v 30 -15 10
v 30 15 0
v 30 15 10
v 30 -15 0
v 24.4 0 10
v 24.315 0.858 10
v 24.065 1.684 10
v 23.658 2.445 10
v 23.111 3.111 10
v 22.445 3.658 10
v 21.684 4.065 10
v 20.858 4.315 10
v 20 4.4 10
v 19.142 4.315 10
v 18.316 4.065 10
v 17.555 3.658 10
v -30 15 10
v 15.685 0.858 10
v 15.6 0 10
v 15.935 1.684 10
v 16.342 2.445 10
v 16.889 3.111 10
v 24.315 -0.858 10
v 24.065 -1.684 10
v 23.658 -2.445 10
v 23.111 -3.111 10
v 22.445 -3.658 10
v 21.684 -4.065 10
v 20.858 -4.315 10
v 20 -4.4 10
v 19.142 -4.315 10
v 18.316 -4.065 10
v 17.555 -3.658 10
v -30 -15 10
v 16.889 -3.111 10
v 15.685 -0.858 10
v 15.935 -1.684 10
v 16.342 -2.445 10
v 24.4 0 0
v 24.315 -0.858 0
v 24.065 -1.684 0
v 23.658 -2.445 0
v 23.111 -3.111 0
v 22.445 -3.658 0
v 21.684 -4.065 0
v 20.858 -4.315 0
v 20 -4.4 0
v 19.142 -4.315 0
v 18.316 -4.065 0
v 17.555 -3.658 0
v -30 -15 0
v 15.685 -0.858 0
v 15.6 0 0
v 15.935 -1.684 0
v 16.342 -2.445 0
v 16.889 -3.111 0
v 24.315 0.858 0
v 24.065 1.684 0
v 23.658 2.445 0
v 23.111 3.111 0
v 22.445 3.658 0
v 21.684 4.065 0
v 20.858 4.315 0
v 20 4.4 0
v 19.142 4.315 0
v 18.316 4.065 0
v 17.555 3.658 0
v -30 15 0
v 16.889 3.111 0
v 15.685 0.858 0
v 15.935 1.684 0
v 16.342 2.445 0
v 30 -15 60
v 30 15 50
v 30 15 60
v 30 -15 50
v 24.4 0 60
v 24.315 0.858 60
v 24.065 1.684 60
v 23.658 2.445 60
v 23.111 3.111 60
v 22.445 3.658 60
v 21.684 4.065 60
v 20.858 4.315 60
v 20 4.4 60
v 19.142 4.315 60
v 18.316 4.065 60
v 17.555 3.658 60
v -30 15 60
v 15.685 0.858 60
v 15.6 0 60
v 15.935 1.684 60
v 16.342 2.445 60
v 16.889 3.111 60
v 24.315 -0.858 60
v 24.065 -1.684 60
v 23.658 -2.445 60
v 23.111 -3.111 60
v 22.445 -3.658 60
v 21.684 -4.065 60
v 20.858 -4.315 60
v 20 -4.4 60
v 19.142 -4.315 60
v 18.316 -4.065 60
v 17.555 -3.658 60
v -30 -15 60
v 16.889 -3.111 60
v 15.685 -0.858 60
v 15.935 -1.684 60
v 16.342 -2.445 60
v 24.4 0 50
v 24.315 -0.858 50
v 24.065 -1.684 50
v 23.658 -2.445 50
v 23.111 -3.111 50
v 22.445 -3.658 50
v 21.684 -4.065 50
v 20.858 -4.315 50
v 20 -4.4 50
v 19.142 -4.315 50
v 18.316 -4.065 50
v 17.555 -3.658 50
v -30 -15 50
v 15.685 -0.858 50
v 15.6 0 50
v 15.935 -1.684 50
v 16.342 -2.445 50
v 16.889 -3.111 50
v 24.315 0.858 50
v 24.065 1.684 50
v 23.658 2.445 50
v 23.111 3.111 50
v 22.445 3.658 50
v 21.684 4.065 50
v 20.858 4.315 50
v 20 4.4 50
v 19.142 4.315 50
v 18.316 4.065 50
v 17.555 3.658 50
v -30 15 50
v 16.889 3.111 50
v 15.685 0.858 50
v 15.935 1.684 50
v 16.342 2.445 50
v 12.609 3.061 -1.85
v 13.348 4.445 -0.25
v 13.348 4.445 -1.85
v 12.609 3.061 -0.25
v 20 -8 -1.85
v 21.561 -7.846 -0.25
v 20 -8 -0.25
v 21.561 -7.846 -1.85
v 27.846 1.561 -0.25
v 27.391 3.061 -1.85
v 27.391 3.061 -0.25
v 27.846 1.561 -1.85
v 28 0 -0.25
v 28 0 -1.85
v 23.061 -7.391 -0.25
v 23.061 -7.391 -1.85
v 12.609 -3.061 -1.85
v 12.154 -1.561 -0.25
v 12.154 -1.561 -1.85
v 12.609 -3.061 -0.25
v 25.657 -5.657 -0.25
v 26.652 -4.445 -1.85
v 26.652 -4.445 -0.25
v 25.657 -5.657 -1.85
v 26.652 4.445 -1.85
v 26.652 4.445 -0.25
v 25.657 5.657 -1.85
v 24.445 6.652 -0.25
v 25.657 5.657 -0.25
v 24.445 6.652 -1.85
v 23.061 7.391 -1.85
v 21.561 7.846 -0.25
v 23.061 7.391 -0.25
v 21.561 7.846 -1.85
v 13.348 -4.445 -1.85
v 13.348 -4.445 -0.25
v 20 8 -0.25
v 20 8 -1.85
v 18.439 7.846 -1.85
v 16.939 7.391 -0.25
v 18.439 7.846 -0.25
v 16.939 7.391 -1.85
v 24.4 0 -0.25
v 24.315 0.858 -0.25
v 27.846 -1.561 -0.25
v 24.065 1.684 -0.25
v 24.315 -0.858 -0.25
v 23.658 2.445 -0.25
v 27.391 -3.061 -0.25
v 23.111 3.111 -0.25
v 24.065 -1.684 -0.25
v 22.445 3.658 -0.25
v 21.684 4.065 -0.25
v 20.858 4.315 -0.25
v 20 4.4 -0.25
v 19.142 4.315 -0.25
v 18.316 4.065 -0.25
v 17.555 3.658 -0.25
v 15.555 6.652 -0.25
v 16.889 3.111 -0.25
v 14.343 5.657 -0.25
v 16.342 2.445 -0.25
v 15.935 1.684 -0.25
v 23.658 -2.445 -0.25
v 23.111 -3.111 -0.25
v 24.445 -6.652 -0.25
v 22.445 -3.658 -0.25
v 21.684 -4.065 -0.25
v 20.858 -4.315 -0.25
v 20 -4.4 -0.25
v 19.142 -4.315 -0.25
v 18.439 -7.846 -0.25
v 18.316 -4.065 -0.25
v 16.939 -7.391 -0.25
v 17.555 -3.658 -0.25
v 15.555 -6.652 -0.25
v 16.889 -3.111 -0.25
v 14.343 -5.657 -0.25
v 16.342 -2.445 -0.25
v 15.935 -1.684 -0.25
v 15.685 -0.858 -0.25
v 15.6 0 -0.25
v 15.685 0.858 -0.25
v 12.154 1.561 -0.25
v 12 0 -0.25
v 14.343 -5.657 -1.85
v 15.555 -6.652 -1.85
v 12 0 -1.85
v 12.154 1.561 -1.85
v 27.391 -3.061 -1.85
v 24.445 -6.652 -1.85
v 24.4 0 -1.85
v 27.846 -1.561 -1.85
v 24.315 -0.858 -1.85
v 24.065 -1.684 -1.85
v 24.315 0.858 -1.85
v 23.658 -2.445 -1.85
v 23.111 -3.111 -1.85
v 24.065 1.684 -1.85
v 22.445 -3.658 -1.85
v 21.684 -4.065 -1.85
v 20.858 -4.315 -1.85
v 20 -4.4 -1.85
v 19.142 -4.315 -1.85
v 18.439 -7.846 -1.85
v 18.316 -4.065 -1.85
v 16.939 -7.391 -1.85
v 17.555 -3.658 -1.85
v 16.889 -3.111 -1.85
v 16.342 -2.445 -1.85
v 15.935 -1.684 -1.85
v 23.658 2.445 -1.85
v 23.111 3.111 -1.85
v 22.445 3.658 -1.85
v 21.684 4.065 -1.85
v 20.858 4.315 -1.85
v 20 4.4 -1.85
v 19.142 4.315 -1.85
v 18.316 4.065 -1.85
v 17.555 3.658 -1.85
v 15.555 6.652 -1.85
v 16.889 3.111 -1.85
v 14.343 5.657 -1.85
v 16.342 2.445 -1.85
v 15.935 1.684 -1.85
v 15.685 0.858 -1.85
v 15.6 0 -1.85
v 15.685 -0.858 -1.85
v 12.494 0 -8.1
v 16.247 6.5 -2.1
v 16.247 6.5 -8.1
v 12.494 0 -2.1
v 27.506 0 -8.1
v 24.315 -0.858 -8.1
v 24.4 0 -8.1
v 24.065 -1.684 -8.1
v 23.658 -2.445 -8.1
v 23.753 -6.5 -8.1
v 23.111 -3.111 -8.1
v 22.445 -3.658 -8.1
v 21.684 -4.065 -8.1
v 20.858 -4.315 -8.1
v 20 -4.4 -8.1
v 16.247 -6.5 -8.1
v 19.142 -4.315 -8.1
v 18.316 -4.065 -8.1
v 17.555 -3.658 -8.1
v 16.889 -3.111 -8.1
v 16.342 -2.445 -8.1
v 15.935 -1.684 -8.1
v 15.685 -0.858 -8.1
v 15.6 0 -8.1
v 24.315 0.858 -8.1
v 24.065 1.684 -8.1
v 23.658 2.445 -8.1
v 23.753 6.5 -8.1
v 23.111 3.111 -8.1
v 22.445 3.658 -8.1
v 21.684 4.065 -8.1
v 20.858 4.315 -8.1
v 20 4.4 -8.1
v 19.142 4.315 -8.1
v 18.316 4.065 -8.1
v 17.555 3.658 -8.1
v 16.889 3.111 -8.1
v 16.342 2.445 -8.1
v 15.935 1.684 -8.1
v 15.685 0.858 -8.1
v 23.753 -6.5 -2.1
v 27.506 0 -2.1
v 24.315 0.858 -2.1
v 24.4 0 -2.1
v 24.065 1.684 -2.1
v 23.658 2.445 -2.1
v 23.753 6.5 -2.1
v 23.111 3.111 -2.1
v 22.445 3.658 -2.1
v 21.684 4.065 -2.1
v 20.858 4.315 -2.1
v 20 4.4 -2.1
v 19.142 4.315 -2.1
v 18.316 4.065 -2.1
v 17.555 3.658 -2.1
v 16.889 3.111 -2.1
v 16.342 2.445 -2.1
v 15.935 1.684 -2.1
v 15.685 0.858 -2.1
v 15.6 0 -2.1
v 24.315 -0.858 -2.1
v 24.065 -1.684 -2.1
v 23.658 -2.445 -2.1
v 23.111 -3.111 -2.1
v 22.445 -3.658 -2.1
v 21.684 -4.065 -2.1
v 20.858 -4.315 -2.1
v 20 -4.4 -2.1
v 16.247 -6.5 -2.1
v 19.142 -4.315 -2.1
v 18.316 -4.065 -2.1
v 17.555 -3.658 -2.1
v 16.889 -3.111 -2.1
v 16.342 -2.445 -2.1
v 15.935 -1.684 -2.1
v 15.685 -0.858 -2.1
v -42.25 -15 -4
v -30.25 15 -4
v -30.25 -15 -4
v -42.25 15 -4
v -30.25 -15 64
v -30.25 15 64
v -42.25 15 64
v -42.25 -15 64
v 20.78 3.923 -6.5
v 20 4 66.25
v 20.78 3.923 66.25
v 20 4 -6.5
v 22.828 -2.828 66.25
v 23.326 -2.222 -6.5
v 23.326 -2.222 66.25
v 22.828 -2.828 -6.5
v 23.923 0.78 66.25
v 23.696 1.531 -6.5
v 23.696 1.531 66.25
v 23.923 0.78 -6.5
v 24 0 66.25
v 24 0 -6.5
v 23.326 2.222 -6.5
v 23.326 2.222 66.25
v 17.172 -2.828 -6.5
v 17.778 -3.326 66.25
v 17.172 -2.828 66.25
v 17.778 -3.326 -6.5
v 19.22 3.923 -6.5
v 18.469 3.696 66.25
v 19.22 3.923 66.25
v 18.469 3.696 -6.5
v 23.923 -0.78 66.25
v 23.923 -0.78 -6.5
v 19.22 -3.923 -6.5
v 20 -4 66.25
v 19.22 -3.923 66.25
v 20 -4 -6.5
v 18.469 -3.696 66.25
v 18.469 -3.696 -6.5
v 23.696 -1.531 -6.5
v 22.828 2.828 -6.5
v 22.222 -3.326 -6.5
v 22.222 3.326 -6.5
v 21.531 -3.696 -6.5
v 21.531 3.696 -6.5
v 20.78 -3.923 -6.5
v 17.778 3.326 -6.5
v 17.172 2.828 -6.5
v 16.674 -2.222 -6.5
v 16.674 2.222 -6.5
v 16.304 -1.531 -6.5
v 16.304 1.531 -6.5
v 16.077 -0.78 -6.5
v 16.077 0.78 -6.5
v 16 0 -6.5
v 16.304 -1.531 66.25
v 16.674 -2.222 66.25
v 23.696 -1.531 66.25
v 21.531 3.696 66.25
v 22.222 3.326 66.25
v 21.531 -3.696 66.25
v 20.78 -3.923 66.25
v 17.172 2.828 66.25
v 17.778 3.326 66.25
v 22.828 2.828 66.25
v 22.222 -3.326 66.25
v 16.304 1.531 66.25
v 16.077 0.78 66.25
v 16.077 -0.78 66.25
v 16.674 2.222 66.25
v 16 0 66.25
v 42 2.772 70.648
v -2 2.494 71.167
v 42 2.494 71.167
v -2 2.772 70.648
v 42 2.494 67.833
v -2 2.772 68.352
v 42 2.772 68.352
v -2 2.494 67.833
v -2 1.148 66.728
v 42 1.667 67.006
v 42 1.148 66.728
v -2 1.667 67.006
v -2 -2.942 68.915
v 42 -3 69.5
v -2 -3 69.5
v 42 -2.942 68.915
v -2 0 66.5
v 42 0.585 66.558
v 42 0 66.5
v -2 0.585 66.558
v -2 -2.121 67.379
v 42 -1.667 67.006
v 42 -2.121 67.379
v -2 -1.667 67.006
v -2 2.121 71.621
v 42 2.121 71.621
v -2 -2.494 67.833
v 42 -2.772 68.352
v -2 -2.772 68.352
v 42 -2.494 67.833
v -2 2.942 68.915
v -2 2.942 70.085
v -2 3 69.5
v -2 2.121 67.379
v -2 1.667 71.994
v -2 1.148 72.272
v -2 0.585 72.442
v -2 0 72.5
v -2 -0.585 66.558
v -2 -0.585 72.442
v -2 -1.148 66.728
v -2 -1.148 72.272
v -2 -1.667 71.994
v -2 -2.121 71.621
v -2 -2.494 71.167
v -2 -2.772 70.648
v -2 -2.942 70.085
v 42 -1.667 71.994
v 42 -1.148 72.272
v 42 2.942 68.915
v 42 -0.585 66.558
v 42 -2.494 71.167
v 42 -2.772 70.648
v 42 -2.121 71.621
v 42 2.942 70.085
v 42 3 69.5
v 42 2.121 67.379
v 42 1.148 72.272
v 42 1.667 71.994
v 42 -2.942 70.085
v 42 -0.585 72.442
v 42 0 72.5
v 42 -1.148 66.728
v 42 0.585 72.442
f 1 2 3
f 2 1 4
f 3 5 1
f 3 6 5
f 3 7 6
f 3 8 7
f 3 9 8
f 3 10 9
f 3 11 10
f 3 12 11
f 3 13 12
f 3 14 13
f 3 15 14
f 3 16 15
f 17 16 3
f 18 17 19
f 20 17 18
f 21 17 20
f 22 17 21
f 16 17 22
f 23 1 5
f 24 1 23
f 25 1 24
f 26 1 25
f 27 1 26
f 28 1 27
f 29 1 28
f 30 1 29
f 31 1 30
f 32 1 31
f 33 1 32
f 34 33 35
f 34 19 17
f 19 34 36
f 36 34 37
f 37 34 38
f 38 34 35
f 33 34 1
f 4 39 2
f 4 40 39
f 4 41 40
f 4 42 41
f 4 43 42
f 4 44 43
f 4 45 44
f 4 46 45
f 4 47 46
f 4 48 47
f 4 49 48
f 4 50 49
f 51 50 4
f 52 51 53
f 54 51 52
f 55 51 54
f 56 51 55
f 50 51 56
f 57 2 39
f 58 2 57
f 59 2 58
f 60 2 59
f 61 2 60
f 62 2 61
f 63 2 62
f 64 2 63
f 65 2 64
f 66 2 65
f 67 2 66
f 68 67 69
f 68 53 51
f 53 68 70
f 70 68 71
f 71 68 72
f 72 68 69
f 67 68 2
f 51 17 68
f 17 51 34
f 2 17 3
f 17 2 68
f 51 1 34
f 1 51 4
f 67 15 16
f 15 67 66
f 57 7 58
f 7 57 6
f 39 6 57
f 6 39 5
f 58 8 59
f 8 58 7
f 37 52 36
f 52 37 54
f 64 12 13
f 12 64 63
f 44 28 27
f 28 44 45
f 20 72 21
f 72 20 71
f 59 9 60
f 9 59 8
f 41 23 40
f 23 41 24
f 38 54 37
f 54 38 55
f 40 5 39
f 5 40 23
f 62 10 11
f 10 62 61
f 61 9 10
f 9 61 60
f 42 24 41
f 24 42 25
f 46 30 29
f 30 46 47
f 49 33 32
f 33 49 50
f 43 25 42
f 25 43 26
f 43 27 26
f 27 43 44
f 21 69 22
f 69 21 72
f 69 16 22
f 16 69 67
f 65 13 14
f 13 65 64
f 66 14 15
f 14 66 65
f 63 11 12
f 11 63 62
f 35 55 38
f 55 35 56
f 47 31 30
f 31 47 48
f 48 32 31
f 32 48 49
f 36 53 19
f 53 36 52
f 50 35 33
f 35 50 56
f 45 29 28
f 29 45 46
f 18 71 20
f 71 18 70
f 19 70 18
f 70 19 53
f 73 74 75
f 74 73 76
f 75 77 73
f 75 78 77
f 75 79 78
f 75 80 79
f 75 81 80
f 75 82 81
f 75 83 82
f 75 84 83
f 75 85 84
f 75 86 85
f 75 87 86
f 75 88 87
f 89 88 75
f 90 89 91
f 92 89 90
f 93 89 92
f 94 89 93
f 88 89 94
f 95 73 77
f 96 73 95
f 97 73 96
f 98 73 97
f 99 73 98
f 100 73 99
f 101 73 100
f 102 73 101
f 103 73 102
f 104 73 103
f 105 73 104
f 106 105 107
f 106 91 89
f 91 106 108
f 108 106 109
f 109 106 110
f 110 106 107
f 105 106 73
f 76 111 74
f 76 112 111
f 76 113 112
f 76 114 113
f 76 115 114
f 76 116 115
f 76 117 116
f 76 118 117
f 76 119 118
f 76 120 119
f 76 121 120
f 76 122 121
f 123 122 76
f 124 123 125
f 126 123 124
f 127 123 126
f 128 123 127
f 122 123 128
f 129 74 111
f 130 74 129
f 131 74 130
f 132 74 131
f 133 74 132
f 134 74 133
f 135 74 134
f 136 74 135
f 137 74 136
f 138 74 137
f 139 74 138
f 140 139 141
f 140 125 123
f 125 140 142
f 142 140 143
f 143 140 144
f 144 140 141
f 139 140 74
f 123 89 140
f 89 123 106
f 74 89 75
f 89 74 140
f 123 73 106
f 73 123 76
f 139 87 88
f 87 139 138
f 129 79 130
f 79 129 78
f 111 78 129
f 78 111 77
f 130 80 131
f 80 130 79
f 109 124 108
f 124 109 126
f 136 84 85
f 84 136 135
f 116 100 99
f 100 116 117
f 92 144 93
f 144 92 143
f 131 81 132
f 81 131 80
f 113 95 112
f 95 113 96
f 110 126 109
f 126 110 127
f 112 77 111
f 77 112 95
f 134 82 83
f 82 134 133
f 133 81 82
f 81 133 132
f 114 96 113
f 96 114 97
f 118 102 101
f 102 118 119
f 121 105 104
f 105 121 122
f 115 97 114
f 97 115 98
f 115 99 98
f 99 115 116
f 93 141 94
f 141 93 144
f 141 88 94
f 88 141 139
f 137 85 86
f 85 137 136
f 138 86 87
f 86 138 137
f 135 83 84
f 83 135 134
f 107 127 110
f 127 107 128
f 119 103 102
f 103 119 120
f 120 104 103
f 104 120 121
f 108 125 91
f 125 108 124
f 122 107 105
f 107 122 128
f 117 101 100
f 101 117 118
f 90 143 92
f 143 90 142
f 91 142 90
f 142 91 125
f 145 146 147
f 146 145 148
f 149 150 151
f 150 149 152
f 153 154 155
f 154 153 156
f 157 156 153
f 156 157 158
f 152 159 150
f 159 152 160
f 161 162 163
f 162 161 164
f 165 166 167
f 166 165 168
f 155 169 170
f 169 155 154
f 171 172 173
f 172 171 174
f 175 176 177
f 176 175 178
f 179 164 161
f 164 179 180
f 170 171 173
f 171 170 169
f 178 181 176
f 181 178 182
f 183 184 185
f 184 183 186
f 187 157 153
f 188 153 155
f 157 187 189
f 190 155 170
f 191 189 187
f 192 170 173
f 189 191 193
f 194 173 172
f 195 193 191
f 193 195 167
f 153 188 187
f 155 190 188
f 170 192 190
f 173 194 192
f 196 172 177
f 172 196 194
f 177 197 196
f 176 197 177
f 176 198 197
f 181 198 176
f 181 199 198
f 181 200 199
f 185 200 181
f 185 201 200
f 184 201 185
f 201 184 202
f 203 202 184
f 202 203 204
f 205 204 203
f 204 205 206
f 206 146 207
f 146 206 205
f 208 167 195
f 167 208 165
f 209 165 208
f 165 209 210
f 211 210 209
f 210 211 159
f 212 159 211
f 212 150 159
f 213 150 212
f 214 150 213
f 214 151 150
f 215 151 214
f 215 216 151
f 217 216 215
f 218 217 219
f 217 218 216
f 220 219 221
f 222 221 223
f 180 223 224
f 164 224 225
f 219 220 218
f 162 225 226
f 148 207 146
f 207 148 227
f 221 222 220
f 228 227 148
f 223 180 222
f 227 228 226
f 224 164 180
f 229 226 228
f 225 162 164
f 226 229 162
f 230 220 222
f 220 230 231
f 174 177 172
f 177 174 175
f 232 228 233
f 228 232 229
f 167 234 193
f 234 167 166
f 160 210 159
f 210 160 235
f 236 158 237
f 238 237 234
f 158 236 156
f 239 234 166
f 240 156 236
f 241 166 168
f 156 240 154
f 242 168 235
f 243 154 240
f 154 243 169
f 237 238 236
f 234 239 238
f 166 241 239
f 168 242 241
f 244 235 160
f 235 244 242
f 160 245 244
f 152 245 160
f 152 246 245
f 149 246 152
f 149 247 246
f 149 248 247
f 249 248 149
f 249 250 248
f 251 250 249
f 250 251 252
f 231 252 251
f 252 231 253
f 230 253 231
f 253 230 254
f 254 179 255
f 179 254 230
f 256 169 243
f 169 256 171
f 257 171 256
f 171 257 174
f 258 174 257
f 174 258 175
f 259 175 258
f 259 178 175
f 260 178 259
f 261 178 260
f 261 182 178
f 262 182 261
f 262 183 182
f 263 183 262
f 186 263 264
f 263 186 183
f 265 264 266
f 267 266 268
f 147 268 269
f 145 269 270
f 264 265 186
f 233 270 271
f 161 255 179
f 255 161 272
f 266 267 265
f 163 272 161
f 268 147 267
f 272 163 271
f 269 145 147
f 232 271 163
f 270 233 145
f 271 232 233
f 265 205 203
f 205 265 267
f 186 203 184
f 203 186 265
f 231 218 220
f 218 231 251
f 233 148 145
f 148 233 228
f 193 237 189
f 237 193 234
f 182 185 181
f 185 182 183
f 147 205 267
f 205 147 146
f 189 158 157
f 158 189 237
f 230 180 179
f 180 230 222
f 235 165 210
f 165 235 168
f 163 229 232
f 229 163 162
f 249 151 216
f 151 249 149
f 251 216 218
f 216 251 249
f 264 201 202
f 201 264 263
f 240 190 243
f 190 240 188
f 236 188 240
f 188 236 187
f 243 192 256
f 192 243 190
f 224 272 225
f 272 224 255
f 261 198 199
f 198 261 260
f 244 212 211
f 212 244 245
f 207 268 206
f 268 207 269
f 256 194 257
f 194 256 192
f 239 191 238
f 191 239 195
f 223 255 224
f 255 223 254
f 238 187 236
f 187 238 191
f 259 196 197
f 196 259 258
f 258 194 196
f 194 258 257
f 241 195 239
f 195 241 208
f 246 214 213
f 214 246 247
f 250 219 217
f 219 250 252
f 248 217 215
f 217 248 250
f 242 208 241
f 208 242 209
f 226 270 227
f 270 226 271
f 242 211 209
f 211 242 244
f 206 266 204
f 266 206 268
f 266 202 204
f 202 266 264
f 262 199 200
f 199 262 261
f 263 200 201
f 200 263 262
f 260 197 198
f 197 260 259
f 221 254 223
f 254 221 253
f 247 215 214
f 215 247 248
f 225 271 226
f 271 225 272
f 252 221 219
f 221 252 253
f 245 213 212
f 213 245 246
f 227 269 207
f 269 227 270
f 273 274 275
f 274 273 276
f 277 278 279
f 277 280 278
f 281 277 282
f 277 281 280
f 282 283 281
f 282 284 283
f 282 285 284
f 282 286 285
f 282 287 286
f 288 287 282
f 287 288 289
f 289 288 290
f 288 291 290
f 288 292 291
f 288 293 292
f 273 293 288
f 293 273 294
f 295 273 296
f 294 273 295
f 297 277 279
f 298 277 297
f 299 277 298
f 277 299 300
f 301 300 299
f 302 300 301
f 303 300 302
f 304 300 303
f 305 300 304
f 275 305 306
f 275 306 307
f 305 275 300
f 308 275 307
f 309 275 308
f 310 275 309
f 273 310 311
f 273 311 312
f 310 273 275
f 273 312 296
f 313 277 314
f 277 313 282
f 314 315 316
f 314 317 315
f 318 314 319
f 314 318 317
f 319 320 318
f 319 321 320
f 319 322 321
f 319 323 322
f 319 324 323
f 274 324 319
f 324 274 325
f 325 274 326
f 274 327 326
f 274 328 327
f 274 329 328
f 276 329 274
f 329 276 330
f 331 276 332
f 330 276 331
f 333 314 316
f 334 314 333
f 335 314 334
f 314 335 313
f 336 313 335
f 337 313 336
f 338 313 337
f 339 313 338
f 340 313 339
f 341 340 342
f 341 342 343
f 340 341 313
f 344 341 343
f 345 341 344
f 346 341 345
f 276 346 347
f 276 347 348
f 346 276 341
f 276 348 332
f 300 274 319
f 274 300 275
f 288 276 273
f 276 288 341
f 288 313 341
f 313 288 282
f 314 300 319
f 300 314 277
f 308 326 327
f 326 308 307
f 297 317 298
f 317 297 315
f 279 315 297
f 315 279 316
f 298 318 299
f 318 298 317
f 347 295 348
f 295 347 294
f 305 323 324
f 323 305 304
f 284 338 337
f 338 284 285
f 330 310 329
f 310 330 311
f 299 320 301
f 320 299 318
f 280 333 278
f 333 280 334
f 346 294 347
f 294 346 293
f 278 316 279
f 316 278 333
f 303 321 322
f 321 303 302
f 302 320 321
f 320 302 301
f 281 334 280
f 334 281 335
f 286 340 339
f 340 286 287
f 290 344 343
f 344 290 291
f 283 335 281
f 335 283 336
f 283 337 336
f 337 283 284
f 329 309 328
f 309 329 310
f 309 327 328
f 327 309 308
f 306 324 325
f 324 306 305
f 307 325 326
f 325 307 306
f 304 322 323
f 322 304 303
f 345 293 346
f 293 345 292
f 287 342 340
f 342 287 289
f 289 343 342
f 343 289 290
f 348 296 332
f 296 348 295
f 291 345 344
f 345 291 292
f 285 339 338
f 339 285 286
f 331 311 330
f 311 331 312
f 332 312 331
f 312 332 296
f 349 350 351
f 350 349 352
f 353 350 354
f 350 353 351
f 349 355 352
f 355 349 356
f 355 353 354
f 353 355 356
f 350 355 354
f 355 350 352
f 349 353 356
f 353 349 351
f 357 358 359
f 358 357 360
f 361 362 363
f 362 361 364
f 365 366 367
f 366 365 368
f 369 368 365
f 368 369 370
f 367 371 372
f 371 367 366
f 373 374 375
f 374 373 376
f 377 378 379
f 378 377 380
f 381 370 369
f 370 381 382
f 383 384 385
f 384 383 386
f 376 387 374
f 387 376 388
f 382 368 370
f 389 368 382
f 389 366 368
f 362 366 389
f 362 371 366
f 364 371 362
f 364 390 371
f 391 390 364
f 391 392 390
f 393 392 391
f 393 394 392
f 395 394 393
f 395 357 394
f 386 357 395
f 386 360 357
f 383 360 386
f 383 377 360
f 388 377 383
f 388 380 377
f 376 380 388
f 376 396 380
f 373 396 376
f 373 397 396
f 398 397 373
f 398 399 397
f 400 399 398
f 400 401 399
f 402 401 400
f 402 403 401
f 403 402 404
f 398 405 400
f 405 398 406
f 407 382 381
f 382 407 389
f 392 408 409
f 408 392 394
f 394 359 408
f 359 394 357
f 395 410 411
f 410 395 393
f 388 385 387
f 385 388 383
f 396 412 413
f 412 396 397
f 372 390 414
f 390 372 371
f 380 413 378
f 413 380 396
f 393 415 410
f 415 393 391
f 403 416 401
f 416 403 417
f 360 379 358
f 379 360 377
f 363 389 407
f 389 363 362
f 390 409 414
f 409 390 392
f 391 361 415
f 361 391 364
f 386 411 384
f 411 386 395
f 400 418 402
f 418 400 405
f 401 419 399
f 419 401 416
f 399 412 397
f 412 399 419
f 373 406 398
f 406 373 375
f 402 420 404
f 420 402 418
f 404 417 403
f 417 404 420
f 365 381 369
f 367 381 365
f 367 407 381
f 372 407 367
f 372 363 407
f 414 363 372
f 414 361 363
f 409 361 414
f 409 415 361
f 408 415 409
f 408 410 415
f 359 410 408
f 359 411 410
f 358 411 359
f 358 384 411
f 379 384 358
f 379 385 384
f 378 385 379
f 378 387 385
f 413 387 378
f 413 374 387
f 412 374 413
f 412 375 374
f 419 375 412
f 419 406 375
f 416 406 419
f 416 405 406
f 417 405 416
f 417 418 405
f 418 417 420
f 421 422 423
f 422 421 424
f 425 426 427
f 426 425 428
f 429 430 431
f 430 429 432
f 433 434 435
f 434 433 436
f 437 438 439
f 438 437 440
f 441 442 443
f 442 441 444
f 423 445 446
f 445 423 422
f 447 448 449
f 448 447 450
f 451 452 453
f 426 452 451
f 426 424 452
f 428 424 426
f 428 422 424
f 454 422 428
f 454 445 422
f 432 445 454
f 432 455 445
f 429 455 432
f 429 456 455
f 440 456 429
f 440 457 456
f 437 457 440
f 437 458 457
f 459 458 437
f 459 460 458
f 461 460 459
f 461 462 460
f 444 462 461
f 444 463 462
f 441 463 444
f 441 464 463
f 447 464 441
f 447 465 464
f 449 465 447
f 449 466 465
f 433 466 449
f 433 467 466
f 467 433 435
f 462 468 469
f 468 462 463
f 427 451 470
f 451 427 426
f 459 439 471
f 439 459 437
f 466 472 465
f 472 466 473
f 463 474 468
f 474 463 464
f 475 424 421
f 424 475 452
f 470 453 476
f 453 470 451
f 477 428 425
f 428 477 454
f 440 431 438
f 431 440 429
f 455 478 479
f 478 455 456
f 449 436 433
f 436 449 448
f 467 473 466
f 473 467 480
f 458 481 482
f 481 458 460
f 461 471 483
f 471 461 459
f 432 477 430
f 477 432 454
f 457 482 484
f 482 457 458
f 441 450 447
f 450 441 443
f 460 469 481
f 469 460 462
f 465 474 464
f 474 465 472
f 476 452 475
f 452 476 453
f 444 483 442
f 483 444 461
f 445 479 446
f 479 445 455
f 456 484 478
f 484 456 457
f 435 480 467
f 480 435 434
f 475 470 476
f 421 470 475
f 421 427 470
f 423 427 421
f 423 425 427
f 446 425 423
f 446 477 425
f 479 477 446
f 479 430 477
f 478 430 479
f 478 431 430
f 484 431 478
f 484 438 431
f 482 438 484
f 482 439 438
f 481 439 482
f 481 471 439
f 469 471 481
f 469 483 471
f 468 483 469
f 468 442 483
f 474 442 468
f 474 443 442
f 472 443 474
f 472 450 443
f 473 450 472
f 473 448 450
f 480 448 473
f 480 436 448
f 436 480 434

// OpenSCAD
$fn = 32;

// ------------------------------------------------------------------------
// C clamp: throat 50 mm, screw d8
// Every part is its own module, assembly() places every instance.
// ------------------------------------------------------------------------

// --- part 1 ---
module clamp_arm() {
  difference() {
    translate([-30, -15, 0]) cube([60, 30, 10]);
    translate([20, 0, -1]) cylinder(h = 12, d = 8.8);
  }
}

// --- part 2 ---
module clamp_spine() {
  difference() {
    translate([-34, -15, 0]) cube([68, 30, 12]);
  }
}

// --- part 3 ---
module clamp_screw() {
  translate([0, 0, -36.375]) cylinder(h = 72.75, d = 8);
}

// --- part 4 ---
module clamp_washer() {
  difference() {
      translate([0, 0, 0]) cylinder(h = 1.6, d = 16);
      translate([0, 0, -1]) cylinder(h = 3.6, d = 8.8);
    }
}

// --- part 5 ---
module clamp_nut() {
  difference() {
    linear_extrude(height = 6) polygon(points = [[7.506, 0], [3.753, 6.5], [-3.753, 6.5], [-7.506, 0], [-3.753, -6.5], [3.753, -6.5]]);
    translate([0, 0, -1]) cylinder(h = 8, d = 8.8);
  }
}

// --- part 6 ---
module tommy_bar() {
  translate([0, 0, -22]) cylinder(h = 44, d = 6);
}

// --- assembly ---
module assembly() {
  color([0.80, 0.24, 0.20]) translate([0, 0, 0]) rotate([0, 0, 0]) clamp_arm();
  color([0.20, 0.45, 0.75]) translate([0, 0, 50]) rotate([0, 0, 0]) clamp_arm();
  color([0.25, 0.62, 0.32]) translate([-42.25, 0, 30]) rotate([0, 90, 0]) clamp_spine();
  color([0.92, 0.70, 0.18]) translate([20, 0, 29.875]) rotate([0, 0, 0]) clamp_screw();
  color([0.58, 0.35, 0.70]) translate([20, 0, -1.85]) rotate([0, 0, 0]) clamp_washer();
  color([0.16, 0.66, 0.66]) translate([20, 0, -8.1]) rotate([0, 0, 0]) clamp_nut();
  color([0.85, 0.48, 0.18]) translate([20, 0, 69.5]) rotate([0, 90, 0]) tommy_bar();
}

assembly();
